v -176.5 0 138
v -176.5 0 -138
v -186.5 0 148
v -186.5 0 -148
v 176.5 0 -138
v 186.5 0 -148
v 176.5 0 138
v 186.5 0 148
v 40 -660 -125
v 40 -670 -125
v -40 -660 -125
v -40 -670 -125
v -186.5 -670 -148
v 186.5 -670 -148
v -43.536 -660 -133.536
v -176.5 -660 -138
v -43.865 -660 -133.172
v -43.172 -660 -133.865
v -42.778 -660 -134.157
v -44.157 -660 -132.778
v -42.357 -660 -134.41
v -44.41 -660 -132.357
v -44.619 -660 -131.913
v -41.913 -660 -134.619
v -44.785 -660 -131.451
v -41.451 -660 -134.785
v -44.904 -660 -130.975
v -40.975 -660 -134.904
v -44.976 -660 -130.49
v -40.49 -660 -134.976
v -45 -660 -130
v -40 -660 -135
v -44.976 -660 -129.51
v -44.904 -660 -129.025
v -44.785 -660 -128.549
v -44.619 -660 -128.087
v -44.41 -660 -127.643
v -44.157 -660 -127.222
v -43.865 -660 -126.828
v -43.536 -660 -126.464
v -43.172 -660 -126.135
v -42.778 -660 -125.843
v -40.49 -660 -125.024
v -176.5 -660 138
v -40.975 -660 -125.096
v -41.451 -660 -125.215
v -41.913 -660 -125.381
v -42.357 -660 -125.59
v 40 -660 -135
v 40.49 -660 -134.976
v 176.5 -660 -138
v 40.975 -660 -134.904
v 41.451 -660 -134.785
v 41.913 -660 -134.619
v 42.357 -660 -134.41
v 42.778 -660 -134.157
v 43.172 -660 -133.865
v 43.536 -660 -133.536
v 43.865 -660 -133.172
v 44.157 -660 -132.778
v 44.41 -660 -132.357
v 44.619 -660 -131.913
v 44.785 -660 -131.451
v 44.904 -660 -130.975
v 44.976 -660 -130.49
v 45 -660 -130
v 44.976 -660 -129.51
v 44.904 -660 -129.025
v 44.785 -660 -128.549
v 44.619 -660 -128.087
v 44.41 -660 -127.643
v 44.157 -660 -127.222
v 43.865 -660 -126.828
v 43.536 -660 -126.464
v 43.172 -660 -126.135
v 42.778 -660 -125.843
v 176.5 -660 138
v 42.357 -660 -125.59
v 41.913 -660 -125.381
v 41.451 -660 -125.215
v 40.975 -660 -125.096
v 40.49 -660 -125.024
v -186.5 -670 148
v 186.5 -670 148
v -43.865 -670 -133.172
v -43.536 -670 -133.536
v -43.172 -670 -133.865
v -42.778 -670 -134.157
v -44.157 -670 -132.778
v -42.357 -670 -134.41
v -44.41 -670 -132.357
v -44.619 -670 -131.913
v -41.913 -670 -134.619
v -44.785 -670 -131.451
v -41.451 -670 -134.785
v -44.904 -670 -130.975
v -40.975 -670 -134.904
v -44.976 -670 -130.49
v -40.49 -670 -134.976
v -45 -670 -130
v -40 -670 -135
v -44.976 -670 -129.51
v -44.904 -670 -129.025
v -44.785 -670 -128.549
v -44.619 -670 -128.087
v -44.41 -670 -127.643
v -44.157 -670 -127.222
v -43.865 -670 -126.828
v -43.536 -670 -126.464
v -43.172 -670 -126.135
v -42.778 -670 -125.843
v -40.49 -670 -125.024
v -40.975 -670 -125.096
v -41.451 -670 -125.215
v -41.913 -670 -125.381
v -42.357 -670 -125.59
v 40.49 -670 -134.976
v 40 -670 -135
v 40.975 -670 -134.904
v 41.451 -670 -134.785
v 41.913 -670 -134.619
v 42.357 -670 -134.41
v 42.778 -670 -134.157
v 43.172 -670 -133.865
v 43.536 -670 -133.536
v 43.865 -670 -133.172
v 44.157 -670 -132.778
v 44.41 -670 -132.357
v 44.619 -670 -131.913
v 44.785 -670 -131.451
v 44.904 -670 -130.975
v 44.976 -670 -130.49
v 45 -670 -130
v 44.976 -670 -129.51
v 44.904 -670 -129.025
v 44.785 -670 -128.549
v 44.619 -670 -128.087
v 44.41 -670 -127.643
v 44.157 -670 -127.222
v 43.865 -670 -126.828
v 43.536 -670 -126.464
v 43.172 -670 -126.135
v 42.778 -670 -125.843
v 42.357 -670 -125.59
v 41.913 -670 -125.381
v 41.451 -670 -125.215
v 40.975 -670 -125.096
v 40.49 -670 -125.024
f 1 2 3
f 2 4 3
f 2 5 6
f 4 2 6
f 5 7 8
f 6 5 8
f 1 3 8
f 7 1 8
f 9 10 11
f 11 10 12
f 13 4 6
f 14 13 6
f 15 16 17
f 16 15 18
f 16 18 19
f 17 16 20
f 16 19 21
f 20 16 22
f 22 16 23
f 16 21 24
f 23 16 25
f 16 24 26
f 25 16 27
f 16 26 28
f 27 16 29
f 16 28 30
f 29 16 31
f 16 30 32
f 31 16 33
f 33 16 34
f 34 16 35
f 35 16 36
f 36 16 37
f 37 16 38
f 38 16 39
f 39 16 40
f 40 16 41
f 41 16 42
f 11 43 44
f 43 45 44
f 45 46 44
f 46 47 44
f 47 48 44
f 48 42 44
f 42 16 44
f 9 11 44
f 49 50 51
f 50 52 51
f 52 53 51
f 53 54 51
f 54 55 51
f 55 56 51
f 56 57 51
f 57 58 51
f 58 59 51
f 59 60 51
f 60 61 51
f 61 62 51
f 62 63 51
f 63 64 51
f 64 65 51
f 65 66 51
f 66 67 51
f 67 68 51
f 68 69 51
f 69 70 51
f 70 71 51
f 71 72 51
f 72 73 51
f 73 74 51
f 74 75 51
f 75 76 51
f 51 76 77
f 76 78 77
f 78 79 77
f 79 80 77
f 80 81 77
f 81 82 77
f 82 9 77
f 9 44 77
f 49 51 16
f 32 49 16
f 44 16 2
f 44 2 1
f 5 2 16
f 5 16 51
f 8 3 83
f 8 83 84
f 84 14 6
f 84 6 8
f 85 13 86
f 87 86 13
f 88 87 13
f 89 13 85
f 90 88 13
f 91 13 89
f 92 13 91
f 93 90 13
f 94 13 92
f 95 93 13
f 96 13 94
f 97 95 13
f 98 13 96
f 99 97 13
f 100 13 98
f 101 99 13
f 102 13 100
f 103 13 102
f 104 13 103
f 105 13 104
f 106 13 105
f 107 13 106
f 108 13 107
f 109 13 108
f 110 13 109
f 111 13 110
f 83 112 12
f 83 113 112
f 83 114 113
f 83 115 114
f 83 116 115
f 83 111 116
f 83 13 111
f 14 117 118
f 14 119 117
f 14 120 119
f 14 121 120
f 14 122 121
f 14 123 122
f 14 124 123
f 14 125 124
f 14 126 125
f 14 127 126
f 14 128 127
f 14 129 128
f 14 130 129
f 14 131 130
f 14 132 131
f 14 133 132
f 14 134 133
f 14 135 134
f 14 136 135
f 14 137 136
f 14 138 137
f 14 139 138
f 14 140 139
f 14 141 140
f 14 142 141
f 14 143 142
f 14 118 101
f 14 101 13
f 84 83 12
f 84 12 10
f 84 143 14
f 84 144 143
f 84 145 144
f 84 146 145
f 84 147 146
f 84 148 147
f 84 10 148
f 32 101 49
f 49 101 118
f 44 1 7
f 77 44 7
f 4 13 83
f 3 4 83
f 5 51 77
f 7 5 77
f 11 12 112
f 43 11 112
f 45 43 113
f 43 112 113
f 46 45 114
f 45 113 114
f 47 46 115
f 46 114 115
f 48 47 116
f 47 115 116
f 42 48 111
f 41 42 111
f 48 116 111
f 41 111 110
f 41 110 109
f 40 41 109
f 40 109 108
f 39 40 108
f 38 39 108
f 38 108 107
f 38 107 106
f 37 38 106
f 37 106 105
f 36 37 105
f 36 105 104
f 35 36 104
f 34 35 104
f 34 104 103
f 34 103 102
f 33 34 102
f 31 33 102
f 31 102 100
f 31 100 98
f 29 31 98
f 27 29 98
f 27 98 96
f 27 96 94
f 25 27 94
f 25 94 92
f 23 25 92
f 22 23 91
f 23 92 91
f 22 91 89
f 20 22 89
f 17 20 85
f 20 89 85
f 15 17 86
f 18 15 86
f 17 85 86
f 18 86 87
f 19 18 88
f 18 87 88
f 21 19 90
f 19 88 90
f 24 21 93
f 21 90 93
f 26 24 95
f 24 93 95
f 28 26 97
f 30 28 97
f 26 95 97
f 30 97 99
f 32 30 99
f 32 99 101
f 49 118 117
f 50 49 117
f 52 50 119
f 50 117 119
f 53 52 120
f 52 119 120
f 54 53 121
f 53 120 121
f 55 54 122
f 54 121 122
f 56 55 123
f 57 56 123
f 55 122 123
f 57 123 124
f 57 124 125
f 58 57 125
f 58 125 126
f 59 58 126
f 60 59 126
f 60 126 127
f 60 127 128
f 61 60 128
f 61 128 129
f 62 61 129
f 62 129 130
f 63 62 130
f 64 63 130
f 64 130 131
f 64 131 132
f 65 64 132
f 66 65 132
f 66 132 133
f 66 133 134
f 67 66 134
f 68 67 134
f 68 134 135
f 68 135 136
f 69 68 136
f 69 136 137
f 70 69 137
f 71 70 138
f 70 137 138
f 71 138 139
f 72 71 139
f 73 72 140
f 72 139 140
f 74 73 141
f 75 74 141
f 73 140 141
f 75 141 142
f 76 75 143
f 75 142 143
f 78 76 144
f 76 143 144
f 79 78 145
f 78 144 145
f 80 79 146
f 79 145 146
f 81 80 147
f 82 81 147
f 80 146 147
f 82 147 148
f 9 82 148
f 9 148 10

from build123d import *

# Parameters (mm, degrees)
F0_W     = 373
F0_H     = 296
F1_DEPTH = 670
F2_T     = -10
F4_DEPTH = 25


with BuildPart() as f1:
    # F0 (on Front) → F1 (new body)
    with BuildSketch(Plane.XZ):
        Rectangle(F0_W, F0_H)
    extrude(amount=F1_DEPTH)

    # F2
    f2_openings = [f1.faces().sort_by_distance(p)[0] for p in [
        (0, 0, 0),
    ]]
    offset(amount=F2_T, openings=f2_openings)

    # F3 (on face) → F4 (cut)
    with BuildSketch(Plane.XZ.offset(670)):
        with BuildLine():
            ThreePointArc((-40, -125), (-45, -130), (-40, -135))
            Line((-40, -135), (40, -135))
            ThreePointArc((40, -135), (45, -130), (40, -125))
            Line((40, -125), (-40, -125))
        make_face()
    extrude(amount=-F4_DEPTH, mode=Mode.SUBTRACT)


solid = f1.part
